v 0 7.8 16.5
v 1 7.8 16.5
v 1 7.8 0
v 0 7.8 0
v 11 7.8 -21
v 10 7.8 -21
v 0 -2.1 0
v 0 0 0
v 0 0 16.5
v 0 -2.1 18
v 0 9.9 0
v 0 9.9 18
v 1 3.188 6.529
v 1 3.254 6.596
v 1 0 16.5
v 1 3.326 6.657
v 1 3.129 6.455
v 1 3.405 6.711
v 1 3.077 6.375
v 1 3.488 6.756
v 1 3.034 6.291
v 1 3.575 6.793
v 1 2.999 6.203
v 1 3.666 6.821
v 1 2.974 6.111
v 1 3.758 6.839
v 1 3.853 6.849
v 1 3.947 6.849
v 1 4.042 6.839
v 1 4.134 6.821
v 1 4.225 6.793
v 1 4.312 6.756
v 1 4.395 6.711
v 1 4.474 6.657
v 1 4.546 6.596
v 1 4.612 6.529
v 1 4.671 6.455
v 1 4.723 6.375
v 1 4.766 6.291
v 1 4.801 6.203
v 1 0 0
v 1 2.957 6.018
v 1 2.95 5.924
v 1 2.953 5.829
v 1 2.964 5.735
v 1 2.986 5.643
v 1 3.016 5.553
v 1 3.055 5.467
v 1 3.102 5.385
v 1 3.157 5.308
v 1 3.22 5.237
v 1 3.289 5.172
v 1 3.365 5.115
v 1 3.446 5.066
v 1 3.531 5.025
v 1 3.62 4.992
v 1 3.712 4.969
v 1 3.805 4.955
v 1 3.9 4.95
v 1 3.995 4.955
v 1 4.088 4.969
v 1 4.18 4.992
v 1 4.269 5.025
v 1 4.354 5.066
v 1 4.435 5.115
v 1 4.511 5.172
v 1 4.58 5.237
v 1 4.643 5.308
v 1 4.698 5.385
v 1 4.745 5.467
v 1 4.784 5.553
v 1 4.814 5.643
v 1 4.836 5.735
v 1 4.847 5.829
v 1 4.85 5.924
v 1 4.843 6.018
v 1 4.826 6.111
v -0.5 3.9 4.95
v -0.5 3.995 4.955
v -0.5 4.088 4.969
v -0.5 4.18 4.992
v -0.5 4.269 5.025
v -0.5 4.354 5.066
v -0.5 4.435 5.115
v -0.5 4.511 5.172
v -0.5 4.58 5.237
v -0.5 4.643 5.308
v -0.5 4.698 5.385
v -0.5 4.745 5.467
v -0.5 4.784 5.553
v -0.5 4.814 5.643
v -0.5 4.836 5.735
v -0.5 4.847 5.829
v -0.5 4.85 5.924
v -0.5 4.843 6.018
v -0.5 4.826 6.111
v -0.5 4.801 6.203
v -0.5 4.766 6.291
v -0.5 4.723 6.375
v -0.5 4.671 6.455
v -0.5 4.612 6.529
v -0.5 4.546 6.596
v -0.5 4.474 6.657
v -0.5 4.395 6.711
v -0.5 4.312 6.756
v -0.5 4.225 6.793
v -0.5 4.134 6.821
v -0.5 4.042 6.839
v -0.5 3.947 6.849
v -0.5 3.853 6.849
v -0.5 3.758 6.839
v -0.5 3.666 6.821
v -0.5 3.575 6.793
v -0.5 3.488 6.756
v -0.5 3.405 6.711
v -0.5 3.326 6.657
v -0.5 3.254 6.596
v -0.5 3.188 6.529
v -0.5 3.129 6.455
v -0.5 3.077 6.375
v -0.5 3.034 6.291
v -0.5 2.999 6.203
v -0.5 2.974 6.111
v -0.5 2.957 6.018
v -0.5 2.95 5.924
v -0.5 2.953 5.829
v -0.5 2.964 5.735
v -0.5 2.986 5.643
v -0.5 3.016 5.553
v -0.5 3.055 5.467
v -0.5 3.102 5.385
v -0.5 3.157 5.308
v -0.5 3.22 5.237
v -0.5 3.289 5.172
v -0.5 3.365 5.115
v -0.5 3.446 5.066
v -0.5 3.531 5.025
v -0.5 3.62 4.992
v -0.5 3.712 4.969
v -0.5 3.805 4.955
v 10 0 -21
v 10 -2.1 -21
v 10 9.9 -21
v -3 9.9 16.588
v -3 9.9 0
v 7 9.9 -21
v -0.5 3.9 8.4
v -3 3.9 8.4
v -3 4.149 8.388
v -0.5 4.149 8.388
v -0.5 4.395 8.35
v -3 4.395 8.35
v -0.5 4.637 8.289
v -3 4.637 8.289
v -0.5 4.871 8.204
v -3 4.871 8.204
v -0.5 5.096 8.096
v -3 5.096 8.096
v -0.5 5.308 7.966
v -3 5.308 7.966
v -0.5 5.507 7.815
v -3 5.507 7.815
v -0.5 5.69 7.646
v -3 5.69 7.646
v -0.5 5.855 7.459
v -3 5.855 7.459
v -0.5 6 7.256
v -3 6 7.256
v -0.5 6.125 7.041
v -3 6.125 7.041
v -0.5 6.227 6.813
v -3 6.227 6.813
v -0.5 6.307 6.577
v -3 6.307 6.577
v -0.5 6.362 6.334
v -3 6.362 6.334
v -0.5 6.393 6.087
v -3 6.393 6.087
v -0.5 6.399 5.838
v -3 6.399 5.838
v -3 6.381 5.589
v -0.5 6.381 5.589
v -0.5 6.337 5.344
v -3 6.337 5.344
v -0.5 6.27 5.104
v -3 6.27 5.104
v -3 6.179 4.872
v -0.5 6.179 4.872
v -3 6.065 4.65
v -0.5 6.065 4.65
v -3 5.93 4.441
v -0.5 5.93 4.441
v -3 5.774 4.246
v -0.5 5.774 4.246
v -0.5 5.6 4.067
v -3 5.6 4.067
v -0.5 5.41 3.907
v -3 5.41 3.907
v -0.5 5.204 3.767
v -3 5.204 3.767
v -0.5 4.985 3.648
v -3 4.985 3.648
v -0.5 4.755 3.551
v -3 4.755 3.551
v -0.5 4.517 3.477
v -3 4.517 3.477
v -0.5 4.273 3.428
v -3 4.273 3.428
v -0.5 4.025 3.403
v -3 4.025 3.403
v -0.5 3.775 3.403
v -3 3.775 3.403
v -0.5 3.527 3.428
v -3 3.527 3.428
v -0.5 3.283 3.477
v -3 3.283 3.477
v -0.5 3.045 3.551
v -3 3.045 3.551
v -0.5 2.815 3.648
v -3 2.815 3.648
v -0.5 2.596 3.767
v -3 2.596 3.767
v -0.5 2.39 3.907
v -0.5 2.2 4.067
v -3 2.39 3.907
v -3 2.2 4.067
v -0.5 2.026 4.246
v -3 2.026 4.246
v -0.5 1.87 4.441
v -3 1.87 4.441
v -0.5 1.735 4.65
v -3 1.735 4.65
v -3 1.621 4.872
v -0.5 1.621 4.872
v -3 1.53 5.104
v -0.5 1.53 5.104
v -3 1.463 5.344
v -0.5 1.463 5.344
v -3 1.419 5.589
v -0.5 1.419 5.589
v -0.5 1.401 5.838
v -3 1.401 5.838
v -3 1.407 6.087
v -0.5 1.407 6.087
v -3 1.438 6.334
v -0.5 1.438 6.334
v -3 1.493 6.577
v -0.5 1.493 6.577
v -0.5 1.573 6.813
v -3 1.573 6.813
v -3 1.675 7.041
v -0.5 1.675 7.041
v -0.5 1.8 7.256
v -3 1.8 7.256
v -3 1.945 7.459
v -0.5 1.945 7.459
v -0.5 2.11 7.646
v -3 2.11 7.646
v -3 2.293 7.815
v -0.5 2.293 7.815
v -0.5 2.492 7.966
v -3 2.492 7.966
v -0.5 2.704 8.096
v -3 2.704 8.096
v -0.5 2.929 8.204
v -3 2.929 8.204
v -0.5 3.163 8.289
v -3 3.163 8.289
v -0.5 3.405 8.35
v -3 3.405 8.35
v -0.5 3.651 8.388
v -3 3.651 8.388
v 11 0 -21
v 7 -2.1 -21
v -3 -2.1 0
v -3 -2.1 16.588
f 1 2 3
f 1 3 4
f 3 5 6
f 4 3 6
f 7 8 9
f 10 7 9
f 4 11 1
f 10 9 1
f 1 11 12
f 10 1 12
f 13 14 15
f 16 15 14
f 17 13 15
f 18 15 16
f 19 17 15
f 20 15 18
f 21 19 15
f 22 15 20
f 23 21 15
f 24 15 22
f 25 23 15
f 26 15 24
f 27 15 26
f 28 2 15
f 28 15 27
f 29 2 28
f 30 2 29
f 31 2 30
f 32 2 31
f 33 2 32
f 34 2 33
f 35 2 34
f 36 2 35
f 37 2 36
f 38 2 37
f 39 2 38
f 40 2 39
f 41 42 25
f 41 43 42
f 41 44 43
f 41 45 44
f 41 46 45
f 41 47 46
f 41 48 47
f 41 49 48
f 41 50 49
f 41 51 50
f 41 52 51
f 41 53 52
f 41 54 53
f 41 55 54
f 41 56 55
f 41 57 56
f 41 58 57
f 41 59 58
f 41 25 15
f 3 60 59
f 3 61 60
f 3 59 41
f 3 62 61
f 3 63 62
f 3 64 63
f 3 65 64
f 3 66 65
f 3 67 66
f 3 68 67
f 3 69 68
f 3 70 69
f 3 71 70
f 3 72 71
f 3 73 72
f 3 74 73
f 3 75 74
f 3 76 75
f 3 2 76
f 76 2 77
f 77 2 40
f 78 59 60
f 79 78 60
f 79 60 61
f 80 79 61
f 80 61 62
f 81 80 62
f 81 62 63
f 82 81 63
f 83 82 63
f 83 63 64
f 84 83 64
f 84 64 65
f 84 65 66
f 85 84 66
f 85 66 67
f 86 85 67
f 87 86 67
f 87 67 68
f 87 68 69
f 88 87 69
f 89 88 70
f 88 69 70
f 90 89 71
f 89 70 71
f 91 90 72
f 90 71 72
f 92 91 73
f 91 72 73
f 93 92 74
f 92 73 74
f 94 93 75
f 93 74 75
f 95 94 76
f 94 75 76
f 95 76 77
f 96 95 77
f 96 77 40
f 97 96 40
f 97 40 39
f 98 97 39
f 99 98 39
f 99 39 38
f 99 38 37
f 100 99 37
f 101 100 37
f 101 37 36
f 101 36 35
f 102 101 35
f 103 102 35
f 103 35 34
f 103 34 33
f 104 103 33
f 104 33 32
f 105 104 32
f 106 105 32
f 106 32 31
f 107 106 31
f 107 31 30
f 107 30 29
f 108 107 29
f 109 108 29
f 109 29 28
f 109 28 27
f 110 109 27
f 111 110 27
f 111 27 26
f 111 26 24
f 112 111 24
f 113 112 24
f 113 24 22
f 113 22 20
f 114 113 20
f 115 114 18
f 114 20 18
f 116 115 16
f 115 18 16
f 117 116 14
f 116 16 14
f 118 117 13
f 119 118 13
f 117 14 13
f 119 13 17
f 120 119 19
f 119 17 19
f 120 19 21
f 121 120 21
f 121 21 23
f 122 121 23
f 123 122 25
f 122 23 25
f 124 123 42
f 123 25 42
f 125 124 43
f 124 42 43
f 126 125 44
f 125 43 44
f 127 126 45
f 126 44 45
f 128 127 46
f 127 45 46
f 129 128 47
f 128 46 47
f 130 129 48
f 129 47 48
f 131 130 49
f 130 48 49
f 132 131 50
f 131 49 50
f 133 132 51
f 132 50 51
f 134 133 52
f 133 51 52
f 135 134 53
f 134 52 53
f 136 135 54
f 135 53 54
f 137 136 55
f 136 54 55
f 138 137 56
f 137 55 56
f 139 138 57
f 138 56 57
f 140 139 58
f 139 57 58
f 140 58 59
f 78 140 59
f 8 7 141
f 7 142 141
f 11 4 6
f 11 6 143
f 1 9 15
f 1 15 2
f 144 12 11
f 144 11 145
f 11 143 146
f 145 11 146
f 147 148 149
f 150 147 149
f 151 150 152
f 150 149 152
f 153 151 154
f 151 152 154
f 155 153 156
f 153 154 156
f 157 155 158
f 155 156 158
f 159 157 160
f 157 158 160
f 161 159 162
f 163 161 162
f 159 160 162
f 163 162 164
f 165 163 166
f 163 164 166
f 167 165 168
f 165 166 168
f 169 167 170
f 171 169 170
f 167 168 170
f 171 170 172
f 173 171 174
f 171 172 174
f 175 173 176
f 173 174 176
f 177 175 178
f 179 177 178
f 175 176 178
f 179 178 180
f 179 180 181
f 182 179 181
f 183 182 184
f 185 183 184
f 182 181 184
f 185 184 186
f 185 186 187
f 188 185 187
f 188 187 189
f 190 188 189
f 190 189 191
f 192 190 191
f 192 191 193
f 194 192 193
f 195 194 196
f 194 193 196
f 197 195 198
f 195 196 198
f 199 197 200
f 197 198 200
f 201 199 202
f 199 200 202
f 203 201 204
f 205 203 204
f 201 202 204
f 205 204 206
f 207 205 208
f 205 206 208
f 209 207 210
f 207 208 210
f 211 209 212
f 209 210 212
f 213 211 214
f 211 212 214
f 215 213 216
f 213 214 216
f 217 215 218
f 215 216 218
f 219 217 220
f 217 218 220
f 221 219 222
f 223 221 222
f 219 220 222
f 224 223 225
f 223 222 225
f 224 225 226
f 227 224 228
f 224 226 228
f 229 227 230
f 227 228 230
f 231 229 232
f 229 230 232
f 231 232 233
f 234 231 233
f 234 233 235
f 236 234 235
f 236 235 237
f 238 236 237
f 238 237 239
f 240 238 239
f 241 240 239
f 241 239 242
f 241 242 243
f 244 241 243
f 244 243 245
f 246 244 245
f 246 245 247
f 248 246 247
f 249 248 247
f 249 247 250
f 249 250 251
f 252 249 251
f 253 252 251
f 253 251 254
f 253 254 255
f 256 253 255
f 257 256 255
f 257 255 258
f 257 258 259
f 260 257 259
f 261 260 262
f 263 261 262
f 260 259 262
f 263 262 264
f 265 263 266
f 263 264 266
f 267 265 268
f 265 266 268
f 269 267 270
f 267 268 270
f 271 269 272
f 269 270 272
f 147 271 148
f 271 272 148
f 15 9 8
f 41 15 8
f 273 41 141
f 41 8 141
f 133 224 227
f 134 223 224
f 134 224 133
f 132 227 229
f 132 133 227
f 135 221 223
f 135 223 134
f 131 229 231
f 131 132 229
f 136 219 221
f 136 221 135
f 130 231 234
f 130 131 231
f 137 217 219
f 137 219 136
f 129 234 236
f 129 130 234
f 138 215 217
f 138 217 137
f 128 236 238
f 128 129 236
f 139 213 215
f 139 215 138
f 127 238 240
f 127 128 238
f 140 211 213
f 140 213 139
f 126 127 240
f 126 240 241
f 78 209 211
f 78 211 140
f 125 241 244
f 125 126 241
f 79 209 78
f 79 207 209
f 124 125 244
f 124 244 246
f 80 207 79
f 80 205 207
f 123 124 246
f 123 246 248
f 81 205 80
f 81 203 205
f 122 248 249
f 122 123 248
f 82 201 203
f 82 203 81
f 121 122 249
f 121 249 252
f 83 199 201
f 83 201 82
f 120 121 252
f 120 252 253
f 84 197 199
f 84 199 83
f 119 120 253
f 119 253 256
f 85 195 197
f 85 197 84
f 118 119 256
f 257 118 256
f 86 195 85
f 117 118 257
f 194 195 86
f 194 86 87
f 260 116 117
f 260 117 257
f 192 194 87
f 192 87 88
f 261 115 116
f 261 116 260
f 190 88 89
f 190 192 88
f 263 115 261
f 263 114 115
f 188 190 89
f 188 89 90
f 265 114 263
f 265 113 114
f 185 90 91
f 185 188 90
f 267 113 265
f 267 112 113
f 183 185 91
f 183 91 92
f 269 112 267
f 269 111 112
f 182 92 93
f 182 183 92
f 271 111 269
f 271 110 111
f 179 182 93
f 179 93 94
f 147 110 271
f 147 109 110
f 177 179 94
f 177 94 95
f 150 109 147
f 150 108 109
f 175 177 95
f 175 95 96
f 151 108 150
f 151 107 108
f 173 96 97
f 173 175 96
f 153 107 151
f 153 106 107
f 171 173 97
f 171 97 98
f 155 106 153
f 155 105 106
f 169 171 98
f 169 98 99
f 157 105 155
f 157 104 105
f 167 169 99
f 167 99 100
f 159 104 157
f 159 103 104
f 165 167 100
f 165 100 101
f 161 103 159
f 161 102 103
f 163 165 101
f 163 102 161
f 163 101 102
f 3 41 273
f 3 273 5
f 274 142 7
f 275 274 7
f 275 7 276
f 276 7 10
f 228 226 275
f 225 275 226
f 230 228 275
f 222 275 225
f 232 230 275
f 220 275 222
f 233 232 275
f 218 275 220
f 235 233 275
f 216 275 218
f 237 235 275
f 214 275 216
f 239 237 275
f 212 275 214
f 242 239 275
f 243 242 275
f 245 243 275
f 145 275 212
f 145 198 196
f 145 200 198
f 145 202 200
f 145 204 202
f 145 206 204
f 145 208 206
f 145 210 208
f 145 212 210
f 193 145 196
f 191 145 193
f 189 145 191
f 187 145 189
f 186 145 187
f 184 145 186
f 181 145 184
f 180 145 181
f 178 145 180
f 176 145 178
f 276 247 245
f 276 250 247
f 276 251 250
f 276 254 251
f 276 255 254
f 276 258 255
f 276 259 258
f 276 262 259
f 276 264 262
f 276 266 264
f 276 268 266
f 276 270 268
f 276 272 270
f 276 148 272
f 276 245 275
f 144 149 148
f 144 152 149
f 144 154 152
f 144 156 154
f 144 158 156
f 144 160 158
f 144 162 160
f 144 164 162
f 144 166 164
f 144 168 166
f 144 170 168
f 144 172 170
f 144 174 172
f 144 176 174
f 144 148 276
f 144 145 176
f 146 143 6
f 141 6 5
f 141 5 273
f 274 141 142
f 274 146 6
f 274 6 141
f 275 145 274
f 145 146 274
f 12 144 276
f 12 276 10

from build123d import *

# Parameters (mm, degrees)
SKETCH1_W           = 16.5
SKETCH1_H           = 7.8
BOSS_EXTRUDE1_DEPTH = 1
SKETCH2_W           = 18
SKETCH2_H           = 12
BOSS_EXTRUDE2_DEPTH = 3
CUT_EXTRUDE1_DEPTH  = 12
SKETCH6_R           = 0.95
CUT_EXTRUDE2_DEPTH  = 4
SKETCH8_R           = 2.5
CUT_EXTRUDE3_DEPTH  = 2.5


with BuildPart() as part:
    # Sketch1 → Boss-Extrude1 (new body)
    with BuildSketch(Plane(origin=(0, 0, 0), x_dir=(0, 0, -1), z_dir=(1, 0, 0))):
        with Locations((-8.25, 3.9)):
            Rectangle(SKETCH1_W, SKETCH1_H)
    extrude(amount=BOSS_EXTRUDE1_DEPTH)

    # Sketch2 → Boss-Extrude2 (add)
    with BuildSketch(Plane.ZY):
        with Locations((9, 3.9)):
            Rectangle(SKETCH2_W, SKETCH2_H)
    extrude(amount=BOSS_EXTRUDE2_DEPTH)

    # Sketch3 → Loft1 section 0
    with BuildSketch(Plane(origin=(0, 0, 0), x_dir=(-1, 0, 0), z_dir=(0, 0, -1))):
        Polygon((0, 7.8), (0, 9.9), (3, 9.9), (3, -2.1), (0, -2.1), (0, 0), (-1, 0), (-1, 7.8), align=None)
    # Sketch4 → Loft1 section 1
    with BuildSketch(Plane(origin=(0, 0, -21), x_dir=(-1, 0, 0), z_dir=(0, 0, -1))):
        Polygon((-11, 7.8), (-10, 7.8), (-10, 9.9), (-7, 9.9), (-7, -2.1), (-10, -2.1), (-10, 0), (-11, 0), align=None)
    loft()

    # Sketch5 → Cut-Extrude1 (cut)
    with BuildSketch(Plane(origin=(0, 9.9, 0), x_dir=(1, 0, 0), z_dir=(0, 1, 0))):
        Polygon((0, -18), (-3, -18), (-3, -16.588307156), align=None)
    extrude(amount=-CUT_EXTRUDE1_DEPTH, mode=Mode.SUBTRACT)

    # Sketch6 → Cut-Extrude2 (cut)
    with BuildSketch(Plane(origin=(1, 0, 0), x_dir=(0, 0, -1), z_dir=(1, 0, 0))):
        with Locations((-5.9, 3.9)):
            Circle(SKETCH6_R)
    extrude(amount=-CUT_EXTRUDE2_DEPTH, mode=Mode.SUBTRACT)

    # Sketch8 → Cut-Extrude3 (cut)
    with BuildSketch(Plane.ZY.offset(3)):
        with Locations((5.9, 3.9)):
            Circle(SKETCH8_R)
    extrude(amount=-CUT_EXTRUDE3_DEPTH, mode=Mode.SUBTRACT)


solid = part.part
